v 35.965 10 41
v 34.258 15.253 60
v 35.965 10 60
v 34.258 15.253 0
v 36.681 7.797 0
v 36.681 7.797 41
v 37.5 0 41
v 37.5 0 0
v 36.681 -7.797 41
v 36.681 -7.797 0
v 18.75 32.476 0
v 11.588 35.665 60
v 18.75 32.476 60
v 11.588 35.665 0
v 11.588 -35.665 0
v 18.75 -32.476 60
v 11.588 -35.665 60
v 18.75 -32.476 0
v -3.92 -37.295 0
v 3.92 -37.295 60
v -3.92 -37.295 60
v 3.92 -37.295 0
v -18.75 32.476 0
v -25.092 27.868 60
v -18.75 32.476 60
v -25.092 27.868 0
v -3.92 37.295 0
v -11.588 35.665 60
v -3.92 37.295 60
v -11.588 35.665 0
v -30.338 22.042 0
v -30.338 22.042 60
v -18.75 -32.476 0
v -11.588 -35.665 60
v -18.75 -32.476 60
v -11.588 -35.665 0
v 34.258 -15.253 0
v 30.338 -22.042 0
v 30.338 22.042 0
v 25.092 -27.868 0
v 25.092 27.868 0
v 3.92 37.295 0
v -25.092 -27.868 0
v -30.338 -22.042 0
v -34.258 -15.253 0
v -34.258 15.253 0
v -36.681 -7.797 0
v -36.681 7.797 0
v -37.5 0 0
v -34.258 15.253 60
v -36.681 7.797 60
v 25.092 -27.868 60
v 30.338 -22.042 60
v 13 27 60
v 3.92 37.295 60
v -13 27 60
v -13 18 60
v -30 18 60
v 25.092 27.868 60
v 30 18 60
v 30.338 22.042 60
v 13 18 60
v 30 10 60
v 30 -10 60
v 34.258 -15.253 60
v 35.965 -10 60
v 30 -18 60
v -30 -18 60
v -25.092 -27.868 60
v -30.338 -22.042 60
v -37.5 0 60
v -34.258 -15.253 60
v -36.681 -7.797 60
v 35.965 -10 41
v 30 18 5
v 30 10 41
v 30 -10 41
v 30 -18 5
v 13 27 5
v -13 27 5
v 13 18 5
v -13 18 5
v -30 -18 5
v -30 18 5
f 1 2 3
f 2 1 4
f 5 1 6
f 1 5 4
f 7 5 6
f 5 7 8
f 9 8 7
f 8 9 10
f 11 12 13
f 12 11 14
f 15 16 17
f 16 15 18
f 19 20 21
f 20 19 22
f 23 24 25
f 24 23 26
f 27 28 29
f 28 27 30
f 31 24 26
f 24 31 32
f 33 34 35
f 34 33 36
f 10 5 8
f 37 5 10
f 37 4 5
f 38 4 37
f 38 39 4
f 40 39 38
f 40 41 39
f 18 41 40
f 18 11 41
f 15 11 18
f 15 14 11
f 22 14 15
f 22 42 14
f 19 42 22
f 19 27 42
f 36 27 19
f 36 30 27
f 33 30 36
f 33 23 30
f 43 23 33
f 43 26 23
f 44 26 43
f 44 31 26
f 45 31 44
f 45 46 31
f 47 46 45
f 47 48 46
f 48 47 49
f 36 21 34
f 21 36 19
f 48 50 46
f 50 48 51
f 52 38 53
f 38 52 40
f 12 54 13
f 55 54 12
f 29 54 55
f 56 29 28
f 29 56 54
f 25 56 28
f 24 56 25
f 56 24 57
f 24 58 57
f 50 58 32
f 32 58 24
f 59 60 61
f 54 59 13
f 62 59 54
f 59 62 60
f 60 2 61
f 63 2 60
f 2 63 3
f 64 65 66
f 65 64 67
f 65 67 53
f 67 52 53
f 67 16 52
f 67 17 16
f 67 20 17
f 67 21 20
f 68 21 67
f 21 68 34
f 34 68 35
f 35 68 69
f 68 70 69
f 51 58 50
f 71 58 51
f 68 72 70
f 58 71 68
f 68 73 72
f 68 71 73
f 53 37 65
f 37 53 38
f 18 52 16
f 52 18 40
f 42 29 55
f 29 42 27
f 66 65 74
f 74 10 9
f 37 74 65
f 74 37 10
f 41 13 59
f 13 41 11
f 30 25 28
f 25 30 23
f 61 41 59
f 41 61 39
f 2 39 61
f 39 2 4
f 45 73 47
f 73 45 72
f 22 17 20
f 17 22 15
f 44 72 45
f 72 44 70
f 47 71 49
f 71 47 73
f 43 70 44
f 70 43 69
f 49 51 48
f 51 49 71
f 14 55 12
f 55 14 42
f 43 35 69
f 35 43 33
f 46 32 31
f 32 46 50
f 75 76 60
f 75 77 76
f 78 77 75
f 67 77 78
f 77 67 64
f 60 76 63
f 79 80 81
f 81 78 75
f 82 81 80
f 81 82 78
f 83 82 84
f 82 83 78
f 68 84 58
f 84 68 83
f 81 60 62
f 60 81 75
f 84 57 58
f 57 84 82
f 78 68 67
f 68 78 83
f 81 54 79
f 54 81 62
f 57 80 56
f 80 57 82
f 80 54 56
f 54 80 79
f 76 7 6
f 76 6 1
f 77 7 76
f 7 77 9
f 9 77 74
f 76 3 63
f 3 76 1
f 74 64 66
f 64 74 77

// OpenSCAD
difference()
{
	cylinder(h=60,d=75);
	translate([-30,-18,5]) cube([60,36,57]);
	translate([-13,17,5]) cube([26,10,57]);
	translate([25,-10,41]) cube([27,20,20]);
}
